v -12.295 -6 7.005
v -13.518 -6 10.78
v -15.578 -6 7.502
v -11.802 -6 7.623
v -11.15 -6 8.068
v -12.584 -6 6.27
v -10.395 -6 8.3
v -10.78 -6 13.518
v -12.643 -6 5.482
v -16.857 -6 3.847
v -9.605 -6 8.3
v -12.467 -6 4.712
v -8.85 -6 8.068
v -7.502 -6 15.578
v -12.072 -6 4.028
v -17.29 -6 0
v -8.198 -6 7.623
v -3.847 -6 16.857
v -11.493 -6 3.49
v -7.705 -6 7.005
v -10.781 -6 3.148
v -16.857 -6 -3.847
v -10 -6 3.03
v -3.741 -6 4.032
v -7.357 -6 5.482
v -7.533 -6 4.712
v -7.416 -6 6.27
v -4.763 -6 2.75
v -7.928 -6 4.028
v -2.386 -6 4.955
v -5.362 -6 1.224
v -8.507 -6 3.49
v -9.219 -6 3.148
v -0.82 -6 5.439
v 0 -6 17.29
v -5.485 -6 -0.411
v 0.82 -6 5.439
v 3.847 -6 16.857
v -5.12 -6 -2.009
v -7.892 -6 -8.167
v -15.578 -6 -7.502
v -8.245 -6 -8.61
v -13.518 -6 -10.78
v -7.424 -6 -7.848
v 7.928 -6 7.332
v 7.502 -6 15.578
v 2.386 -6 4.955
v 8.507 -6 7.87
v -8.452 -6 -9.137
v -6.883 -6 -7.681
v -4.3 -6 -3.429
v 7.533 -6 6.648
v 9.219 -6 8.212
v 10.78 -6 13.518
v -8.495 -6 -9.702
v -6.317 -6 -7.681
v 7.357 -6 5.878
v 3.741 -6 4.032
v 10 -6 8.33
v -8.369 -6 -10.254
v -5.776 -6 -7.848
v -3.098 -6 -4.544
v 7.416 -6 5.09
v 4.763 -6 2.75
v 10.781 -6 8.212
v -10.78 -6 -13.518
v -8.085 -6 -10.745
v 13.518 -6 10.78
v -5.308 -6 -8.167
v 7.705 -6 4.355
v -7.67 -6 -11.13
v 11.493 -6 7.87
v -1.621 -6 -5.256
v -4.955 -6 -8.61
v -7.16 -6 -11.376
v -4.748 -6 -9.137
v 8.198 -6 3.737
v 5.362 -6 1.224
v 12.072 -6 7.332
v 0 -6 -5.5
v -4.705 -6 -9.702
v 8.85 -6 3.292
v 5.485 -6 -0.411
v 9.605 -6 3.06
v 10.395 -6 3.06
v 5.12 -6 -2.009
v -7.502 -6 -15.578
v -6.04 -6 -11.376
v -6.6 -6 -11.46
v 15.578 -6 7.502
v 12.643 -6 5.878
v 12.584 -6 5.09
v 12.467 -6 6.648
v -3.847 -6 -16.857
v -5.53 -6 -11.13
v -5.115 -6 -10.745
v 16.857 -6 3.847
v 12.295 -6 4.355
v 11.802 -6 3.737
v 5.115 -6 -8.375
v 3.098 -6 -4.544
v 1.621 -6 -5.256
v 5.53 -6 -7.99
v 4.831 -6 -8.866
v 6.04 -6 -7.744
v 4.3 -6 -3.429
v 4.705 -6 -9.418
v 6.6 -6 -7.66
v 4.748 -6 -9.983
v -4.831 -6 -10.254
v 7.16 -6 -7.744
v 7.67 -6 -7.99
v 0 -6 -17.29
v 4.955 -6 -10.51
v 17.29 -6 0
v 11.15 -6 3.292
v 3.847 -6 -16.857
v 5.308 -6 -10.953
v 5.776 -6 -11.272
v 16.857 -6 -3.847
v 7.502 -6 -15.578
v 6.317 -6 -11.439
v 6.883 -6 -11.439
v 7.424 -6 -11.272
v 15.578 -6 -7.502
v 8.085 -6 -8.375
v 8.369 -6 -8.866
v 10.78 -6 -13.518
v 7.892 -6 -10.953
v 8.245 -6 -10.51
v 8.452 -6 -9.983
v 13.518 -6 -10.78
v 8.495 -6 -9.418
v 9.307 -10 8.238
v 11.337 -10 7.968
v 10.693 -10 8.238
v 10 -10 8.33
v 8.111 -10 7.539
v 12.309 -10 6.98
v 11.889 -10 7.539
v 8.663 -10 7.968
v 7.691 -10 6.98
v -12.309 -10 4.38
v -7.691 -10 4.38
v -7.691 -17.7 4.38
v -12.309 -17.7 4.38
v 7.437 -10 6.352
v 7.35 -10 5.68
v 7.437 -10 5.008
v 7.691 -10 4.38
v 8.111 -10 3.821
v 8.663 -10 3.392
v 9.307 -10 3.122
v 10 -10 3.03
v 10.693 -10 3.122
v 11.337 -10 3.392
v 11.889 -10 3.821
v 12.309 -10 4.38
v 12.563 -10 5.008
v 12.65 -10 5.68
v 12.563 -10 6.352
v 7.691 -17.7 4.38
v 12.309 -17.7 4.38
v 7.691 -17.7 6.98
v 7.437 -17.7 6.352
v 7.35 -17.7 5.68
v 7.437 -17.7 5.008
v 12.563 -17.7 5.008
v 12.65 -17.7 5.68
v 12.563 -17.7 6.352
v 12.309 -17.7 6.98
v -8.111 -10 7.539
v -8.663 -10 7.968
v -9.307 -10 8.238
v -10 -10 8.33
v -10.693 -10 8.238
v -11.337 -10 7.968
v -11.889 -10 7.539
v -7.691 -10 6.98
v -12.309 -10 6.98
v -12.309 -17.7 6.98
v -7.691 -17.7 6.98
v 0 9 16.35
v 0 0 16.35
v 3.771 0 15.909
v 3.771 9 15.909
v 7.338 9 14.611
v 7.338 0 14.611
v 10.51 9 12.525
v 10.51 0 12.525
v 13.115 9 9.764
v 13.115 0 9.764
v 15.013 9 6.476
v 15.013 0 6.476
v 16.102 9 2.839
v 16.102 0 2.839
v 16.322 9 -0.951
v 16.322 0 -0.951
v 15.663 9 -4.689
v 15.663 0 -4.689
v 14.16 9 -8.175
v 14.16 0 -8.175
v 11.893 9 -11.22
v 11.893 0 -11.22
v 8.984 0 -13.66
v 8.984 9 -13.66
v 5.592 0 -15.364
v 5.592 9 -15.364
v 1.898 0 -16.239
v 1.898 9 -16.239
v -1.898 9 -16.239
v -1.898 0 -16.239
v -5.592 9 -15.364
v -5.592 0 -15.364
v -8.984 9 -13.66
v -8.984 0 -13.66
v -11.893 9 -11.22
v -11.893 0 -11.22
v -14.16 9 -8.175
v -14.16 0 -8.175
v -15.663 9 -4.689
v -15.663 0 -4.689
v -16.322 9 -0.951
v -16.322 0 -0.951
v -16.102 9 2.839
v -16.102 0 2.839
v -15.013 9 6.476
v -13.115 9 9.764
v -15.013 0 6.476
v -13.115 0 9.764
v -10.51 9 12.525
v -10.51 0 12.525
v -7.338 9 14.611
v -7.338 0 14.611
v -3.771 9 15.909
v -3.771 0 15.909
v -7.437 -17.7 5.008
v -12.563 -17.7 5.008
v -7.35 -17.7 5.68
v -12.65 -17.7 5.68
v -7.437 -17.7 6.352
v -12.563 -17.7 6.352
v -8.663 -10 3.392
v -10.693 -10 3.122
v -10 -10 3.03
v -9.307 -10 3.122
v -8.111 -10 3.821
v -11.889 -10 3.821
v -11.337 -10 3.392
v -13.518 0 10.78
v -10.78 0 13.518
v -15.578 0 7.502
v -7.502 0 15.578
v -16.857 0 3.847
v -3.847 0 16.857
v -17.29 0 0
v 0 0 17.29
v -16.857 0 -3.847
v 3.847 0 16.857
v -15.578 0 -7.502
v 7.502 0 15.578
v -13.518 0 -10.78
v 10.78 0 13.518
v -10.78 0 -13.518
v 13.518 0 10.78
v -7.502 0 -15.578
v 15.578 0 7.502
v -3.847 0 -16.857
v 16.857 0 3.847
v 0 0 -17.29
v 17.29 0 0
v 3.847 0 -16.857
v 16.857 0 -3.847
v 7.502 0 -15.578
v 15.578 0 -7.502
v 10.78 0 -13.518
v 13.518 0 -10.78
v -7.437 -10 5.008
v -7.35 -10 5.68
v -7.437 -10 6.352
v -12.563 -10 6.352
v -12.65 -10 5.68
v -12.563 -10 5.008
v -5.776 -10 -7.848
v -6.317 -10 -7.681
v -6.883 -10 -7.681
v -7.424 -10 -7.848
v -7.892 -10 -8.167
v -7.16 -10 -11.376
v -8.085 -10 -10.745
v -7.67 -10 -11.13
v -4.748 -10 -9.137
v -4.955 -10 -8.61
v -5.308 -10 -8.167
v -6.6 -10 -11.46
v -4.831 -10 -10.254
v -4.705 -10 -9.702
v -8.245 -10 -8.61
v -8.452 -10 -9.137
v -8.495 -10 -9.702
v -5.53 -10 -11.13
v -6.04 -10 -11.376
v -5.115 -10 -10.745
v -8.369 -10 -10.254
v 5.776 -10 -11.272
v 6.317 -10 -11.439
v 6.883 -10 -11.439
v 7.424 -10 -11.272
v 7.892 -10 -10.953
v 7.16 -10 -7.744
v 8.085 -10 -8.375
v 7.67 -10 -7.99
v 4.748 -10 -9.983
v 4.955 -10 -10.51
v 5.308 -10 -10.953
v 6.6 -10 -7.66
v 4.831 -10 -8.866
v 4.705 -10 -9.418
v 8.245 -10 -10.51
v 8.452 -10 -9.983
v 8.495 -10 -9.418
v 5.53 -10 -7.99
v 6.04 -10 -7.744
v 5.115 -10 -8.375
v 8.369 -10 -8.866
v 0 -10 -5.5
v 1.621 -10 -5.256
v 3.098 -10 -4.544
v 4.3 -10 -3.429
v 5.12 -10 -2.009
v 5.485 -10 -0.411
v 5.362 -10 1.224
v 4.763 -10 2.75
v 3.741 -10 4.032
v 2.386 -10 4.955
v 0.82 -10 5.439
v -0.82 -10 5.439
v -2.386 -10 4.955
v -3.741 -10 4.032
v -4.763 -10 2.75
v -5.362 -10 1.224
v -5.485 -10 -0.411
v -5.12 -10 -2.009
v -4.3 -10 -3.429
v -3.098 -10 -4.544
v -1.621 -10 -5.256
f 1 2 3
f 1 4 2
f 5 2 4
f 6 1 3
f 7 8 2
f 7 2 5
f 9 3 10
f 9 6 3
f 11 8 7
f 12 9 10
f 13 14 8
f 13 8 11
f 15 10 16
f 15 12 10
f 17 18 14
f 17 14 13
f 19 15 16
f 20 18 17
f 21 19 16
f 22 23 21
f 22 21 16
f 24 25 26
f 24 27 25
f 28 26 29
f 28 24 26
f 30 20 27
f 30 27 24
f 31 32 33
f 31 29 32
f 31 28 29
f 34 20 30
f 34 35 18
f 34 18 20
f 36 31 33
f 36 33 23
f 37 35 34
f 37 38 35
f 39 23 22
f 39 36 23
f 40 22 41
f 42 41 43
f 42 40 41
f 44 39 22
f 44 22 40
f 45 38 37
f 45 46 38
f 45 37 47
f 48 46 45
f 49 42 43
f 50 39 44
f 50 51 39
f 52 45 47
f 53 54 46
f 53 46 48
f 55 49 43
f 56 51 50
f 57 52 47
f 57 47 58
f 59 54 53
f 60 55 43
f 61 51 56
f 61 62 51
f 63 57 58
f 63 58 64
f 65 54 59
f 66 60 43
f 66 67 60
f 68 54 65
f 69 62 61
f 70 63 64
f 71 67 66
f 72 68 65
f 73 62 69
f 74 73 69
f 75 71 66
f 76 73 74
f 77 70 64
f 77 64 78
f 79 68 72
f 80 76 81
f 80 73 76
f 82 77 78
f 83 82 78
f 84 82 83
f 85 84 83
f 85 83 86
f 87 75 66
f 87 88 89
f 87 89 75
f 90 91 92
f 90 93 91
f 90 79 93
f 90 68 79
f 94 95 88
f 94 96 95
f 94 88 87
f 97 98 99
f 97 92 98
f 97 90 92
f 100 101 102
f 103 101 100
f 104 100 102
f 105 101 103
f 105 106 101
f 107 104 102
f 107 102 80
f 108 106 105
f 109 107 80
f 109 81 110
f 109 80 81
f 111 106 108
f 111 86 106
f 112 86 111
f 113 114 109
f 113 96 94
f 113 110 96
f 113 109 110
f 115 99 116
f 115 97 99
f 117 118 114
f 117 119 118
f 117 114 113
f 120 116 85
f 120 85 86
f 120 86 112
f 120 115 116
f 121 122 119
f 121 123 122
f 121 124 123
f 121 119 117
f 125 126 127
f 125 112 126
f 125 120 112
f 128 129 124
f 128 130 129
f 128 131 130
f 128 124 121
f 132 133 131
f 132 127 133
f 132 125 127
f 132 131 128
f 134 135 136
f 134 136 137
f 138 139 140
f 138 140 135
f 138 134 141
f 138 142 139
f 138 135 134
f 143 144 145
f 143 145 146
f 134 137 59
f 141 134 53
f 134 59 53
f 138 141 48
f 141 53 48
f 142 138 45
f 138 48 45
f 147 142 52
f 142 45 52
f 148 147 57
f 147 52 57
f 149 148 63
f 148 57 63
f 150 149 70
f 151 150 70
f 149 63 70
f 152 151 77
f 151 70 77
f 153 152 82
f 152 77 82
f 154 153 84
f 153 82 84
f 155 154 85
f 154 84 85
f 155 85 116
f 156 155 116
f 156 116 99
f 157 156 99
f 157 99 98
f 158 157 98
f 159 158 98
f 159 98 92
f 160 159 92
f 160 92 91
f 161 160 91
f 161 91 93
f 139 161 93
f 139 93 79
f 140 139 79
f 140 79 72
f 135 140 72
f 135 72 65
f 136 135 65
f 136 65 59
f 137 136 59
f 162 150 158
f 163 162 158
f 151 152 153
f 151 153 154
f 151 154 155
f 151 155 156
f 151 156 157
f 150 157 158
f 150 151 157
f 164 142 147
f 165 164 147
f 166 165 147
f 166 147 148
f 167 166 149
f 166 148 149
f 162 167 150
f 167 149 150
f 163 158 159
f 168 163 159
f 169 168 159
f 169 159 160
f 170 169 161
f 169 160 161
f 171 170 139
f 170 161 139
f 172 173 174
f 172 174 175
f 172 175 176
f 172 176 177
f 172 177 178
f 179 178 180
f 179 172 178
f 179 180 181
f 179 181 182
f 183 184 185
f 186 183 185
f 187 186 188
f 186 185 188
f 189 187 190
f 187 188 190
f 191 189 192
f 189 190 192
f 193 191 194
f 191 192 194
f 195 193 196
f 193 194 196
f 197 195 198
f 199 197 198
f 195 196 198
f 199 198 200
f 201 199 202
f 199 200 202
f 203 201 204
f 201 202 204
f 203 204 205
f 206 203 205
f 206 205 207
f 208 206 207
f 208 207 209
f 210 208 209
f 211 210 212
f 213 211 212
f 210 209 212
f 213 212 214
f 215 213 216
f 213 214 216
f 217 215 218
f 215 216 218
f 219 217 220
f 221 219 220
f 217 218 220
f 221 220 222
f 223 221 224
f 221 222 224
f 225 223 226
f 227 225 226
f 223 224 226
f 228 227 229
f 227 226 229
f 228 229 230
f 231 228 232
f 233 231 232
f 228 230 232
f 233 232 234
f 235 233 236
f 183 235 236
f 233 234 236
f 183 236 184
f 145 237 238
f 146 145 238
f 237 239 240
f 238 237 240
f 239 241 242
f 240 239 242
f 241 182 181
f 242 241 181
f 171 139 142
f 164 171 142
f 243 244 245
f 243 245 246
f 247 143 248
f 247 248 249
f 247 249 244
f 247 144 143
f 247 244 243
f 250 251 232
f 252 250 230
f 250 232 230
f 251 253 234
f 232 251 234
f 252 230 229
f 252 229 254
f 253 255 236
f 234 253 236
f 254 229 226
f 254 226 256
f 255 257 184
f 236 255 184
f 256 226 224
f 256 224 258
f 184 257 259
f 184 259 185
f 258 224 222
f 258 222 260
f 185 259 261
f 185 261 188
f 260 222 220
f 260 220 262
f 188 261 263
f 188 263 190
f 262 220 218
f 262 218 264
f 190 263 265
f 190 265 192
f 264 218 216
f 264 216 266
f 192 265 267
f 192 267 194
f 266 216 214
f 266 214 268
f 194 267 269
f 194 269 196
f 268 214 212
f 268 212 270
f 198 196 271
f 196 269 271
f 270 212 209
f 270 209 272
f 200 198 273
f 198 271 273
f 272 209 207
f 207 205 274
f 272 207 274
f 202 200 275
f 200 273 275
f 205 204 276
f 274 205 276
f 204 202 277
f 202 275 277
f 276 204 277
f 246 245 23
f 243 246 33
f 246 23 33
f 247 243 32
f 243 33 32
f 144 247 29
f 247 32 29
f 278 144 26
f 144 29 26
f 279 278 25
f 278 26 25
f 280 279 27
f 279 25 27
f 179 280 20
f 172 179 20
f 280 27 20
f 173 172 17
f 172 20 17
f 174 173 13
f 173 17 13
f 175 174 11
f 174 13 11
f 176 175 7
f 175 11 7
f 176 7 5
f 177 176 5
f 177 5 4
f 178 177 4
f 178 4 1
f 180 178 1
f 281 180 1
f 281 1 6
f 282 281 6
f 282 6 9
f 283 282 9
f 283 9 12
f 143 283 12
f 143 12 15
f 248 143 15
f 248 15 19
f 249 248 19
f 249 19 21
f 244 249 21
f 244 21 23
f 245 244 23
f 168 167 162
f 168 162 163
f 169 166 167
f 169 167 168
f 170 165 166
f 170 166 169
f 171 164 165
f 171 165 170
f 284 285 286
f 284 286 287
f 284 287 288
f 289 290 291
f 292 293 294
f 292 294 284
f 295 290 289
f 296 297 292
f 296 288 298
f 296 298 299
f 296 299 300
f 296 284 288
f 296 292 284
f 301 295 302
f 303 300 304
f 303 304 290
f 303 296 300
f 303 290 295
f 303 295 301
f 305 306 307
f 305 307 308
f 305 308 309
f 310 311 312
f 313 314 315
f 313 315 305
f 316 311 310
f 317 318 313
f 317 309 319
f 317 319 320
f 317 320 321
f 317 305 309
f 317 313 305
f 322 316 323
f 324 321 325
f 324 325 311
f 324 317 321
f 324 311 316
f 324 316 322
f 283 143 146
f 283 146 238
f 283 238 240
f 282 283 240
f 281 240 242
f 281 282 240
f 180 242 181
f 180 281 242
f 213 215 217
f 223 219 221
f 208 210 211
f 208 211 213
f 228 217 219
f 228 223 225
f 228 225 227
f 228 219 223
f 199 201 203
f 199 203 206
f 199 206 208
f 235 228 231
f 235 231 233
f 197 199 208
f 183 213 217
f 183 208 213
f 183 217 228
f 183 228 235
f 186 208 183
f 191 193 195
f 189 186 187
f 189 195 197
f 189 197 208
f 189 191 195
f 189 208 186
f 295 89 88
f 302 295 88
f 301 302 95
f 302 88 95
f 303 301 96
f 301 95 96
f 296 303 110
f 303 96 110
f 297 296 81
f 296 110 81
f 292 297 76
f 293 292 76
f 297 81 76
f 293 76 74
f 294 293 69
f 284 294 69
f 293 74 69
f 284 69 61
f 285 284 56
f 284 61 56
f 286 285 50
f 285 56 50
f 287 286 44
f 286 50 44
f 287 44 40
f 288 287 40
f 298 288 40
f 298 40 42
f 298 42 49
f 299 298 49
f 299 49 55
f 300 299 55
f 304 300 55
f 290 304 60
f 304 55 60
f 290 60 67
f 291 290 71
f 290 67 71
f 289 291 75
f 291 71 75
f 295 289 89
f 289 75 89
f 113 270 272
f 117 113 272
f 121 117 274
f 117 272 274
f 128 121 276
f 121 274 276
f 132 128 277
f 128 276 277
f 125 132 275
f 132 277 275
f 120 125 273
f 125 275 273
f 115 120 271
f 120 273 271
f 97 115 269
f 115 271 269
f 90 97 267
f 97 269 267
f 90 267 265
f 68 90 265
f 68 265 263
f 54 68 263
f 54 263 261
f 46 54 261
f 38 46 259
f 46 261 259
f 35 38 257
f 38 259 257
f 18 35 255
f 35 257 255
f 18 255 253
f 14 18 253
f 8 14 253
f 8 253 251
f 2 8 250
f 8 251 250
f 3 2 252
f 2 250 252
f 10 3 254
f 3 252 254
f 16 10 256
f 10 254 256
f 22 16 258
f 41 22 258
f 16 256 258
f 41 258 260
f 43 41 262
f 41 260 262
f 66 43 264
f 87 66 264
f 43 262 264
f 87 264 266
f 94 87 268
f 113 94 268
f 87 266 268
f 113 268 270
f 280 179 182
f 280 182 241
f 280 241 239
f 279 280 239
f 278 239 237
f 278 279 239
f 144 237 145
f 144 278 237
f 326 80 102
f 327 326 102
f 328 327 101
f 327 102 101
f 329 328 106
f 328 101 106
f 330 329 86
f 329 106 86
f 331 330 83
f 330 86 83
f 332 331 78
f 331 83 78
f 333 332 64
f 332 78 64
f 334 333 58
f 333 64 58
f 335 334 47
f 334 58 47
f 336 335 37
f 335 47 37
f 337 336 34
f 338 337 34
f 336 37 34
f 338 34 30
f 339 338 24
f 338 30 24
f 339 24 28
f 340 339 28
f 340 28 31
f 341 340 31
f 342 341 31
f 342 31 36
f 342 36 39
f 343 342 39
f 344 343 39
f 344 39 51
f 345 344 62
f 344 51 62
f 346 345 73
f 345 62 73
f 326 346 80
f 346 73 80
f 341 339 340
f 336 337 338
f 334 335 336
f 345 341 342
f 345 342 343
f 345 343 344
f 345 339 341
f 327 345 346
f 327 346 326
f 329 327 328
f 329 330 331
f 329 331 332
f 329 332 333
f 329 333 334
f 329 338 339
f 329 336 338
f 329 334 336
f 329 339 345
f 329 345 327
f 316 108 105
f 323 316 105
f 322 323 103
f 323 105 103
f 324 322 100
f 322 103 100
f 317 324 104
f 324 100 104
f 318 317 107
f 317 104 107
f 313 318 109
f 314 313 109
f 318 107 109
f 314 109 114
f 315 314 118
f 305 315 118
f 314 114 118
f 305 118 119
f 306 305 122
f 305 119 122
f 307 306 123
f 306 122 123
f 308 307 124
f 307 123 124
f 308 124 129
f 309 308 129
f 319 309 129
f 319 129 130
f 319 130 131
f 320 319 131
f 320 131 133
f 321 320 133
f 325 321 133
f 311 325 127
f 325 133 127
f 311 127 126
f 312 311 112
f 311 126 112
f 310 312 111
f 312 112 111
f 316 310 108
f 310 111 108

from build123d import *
from build123d.topology import SkipClean

# Parameters (mm, degrees)
SKETCH_1_R      = 16.35
EXTRUDE_1_DEPTH = 9
SKETCH_2_R      = 17.29
EXTRUDE_2_DEPTH = 6
SKETCH_3_R      = 5.5
SKETCH_3_R_2    = 1.9
SKETCH_3_R_3    = 2.65
EXTRUDE_3_DEPTH = 4
EXTRUDE_4_DEPTH = 7.7


with BuildPart() as part:
    # 草图1 → 凸台-拉伸1 (new body)
    with BuildSketch(Plane(origin=(0, 0, 0), x_dir=(1, 0, 0), z_dir=(0, 1, 0))):
        with Locations(Location((0, 0, 0), (0, 0, 270))):
            Circle(SKETCH_1_R)
    extrude(amount=EXTRUDE_1_DEPTH)

    # 草图2 → 凸台-拉伸2 (add)
    with BuildSketch(Plane.XZ):
        with Locations(Location((0, 0, 0), (0, 0, 270))):
            Circle(SKETCH_2_R)
    extrude(amount=EXTRUDE_2_DEPTH)

    # 草图3 → 凸台-拉伸3 (add)
    with BuildSketch(Plane.XZ.offset(6)):
        with Locations(Location((0, 0, 0), (0, 0, 270))):
            Circle(SKETCH_3_R)
        with Locations(Location((-6.6, -9.56, 0), (0, 0, 270))):
            Circle(SKETCH_3_R_2)
        with Locations(Location((-10, 5.68, 0), (0, 0, 270))):
            Circle(SKETCH_3_R_3)
        with Locations(Location((6.6, -9.56, 0), (0, 0, 90))):
            Circle(SKETCH_3_R_2)
        with Locations(Location((10, 5.68, 0), (0, 0, 90))):
            Circle(SKETCH_3_R_3)
    extrude(amount=EXTRUDE_3_DEPTH)

    # 草图4 → 凸台-拉伸4 (add)
    with SkipClean():  # the faces are left unmerged after this step: merging them gives an invalid solid
        with BuildSketch(Plane.XZ.offset(10)):
            with BuildLine():
                Line((-12.309220648, 6.98), (-7.690779352, 6.98))
                ThreePointArc((-7.690779352, 6.98), (-7.35, 5.68), (-7.690779352, 4.38))
                Line((-7.690779352, 4.38), (-12.309220648, 4.38))
                ThreePointArc((-12.309220648, 4.38), (-12.65, 5.68), (-12.309220648, 6.98))
            make_face()
            with BuildLine():
                Line((12.309220648, 6.98), (7.690779352, 6.98))
                ThreePointArc((7.690779352, 6.98), (7.35, 5.68), (7.690779352, 4.38))
                Line((7.690779352, 4.38), (12.309220648, 4.38))
                ThreePointArc((12.309220648, 4.38), (12.65, 5.68), (12.309220648, 6.98))
            make_face()
        extrude(amount=EXTRUDE_4_DEPTH)


solid = part.part
